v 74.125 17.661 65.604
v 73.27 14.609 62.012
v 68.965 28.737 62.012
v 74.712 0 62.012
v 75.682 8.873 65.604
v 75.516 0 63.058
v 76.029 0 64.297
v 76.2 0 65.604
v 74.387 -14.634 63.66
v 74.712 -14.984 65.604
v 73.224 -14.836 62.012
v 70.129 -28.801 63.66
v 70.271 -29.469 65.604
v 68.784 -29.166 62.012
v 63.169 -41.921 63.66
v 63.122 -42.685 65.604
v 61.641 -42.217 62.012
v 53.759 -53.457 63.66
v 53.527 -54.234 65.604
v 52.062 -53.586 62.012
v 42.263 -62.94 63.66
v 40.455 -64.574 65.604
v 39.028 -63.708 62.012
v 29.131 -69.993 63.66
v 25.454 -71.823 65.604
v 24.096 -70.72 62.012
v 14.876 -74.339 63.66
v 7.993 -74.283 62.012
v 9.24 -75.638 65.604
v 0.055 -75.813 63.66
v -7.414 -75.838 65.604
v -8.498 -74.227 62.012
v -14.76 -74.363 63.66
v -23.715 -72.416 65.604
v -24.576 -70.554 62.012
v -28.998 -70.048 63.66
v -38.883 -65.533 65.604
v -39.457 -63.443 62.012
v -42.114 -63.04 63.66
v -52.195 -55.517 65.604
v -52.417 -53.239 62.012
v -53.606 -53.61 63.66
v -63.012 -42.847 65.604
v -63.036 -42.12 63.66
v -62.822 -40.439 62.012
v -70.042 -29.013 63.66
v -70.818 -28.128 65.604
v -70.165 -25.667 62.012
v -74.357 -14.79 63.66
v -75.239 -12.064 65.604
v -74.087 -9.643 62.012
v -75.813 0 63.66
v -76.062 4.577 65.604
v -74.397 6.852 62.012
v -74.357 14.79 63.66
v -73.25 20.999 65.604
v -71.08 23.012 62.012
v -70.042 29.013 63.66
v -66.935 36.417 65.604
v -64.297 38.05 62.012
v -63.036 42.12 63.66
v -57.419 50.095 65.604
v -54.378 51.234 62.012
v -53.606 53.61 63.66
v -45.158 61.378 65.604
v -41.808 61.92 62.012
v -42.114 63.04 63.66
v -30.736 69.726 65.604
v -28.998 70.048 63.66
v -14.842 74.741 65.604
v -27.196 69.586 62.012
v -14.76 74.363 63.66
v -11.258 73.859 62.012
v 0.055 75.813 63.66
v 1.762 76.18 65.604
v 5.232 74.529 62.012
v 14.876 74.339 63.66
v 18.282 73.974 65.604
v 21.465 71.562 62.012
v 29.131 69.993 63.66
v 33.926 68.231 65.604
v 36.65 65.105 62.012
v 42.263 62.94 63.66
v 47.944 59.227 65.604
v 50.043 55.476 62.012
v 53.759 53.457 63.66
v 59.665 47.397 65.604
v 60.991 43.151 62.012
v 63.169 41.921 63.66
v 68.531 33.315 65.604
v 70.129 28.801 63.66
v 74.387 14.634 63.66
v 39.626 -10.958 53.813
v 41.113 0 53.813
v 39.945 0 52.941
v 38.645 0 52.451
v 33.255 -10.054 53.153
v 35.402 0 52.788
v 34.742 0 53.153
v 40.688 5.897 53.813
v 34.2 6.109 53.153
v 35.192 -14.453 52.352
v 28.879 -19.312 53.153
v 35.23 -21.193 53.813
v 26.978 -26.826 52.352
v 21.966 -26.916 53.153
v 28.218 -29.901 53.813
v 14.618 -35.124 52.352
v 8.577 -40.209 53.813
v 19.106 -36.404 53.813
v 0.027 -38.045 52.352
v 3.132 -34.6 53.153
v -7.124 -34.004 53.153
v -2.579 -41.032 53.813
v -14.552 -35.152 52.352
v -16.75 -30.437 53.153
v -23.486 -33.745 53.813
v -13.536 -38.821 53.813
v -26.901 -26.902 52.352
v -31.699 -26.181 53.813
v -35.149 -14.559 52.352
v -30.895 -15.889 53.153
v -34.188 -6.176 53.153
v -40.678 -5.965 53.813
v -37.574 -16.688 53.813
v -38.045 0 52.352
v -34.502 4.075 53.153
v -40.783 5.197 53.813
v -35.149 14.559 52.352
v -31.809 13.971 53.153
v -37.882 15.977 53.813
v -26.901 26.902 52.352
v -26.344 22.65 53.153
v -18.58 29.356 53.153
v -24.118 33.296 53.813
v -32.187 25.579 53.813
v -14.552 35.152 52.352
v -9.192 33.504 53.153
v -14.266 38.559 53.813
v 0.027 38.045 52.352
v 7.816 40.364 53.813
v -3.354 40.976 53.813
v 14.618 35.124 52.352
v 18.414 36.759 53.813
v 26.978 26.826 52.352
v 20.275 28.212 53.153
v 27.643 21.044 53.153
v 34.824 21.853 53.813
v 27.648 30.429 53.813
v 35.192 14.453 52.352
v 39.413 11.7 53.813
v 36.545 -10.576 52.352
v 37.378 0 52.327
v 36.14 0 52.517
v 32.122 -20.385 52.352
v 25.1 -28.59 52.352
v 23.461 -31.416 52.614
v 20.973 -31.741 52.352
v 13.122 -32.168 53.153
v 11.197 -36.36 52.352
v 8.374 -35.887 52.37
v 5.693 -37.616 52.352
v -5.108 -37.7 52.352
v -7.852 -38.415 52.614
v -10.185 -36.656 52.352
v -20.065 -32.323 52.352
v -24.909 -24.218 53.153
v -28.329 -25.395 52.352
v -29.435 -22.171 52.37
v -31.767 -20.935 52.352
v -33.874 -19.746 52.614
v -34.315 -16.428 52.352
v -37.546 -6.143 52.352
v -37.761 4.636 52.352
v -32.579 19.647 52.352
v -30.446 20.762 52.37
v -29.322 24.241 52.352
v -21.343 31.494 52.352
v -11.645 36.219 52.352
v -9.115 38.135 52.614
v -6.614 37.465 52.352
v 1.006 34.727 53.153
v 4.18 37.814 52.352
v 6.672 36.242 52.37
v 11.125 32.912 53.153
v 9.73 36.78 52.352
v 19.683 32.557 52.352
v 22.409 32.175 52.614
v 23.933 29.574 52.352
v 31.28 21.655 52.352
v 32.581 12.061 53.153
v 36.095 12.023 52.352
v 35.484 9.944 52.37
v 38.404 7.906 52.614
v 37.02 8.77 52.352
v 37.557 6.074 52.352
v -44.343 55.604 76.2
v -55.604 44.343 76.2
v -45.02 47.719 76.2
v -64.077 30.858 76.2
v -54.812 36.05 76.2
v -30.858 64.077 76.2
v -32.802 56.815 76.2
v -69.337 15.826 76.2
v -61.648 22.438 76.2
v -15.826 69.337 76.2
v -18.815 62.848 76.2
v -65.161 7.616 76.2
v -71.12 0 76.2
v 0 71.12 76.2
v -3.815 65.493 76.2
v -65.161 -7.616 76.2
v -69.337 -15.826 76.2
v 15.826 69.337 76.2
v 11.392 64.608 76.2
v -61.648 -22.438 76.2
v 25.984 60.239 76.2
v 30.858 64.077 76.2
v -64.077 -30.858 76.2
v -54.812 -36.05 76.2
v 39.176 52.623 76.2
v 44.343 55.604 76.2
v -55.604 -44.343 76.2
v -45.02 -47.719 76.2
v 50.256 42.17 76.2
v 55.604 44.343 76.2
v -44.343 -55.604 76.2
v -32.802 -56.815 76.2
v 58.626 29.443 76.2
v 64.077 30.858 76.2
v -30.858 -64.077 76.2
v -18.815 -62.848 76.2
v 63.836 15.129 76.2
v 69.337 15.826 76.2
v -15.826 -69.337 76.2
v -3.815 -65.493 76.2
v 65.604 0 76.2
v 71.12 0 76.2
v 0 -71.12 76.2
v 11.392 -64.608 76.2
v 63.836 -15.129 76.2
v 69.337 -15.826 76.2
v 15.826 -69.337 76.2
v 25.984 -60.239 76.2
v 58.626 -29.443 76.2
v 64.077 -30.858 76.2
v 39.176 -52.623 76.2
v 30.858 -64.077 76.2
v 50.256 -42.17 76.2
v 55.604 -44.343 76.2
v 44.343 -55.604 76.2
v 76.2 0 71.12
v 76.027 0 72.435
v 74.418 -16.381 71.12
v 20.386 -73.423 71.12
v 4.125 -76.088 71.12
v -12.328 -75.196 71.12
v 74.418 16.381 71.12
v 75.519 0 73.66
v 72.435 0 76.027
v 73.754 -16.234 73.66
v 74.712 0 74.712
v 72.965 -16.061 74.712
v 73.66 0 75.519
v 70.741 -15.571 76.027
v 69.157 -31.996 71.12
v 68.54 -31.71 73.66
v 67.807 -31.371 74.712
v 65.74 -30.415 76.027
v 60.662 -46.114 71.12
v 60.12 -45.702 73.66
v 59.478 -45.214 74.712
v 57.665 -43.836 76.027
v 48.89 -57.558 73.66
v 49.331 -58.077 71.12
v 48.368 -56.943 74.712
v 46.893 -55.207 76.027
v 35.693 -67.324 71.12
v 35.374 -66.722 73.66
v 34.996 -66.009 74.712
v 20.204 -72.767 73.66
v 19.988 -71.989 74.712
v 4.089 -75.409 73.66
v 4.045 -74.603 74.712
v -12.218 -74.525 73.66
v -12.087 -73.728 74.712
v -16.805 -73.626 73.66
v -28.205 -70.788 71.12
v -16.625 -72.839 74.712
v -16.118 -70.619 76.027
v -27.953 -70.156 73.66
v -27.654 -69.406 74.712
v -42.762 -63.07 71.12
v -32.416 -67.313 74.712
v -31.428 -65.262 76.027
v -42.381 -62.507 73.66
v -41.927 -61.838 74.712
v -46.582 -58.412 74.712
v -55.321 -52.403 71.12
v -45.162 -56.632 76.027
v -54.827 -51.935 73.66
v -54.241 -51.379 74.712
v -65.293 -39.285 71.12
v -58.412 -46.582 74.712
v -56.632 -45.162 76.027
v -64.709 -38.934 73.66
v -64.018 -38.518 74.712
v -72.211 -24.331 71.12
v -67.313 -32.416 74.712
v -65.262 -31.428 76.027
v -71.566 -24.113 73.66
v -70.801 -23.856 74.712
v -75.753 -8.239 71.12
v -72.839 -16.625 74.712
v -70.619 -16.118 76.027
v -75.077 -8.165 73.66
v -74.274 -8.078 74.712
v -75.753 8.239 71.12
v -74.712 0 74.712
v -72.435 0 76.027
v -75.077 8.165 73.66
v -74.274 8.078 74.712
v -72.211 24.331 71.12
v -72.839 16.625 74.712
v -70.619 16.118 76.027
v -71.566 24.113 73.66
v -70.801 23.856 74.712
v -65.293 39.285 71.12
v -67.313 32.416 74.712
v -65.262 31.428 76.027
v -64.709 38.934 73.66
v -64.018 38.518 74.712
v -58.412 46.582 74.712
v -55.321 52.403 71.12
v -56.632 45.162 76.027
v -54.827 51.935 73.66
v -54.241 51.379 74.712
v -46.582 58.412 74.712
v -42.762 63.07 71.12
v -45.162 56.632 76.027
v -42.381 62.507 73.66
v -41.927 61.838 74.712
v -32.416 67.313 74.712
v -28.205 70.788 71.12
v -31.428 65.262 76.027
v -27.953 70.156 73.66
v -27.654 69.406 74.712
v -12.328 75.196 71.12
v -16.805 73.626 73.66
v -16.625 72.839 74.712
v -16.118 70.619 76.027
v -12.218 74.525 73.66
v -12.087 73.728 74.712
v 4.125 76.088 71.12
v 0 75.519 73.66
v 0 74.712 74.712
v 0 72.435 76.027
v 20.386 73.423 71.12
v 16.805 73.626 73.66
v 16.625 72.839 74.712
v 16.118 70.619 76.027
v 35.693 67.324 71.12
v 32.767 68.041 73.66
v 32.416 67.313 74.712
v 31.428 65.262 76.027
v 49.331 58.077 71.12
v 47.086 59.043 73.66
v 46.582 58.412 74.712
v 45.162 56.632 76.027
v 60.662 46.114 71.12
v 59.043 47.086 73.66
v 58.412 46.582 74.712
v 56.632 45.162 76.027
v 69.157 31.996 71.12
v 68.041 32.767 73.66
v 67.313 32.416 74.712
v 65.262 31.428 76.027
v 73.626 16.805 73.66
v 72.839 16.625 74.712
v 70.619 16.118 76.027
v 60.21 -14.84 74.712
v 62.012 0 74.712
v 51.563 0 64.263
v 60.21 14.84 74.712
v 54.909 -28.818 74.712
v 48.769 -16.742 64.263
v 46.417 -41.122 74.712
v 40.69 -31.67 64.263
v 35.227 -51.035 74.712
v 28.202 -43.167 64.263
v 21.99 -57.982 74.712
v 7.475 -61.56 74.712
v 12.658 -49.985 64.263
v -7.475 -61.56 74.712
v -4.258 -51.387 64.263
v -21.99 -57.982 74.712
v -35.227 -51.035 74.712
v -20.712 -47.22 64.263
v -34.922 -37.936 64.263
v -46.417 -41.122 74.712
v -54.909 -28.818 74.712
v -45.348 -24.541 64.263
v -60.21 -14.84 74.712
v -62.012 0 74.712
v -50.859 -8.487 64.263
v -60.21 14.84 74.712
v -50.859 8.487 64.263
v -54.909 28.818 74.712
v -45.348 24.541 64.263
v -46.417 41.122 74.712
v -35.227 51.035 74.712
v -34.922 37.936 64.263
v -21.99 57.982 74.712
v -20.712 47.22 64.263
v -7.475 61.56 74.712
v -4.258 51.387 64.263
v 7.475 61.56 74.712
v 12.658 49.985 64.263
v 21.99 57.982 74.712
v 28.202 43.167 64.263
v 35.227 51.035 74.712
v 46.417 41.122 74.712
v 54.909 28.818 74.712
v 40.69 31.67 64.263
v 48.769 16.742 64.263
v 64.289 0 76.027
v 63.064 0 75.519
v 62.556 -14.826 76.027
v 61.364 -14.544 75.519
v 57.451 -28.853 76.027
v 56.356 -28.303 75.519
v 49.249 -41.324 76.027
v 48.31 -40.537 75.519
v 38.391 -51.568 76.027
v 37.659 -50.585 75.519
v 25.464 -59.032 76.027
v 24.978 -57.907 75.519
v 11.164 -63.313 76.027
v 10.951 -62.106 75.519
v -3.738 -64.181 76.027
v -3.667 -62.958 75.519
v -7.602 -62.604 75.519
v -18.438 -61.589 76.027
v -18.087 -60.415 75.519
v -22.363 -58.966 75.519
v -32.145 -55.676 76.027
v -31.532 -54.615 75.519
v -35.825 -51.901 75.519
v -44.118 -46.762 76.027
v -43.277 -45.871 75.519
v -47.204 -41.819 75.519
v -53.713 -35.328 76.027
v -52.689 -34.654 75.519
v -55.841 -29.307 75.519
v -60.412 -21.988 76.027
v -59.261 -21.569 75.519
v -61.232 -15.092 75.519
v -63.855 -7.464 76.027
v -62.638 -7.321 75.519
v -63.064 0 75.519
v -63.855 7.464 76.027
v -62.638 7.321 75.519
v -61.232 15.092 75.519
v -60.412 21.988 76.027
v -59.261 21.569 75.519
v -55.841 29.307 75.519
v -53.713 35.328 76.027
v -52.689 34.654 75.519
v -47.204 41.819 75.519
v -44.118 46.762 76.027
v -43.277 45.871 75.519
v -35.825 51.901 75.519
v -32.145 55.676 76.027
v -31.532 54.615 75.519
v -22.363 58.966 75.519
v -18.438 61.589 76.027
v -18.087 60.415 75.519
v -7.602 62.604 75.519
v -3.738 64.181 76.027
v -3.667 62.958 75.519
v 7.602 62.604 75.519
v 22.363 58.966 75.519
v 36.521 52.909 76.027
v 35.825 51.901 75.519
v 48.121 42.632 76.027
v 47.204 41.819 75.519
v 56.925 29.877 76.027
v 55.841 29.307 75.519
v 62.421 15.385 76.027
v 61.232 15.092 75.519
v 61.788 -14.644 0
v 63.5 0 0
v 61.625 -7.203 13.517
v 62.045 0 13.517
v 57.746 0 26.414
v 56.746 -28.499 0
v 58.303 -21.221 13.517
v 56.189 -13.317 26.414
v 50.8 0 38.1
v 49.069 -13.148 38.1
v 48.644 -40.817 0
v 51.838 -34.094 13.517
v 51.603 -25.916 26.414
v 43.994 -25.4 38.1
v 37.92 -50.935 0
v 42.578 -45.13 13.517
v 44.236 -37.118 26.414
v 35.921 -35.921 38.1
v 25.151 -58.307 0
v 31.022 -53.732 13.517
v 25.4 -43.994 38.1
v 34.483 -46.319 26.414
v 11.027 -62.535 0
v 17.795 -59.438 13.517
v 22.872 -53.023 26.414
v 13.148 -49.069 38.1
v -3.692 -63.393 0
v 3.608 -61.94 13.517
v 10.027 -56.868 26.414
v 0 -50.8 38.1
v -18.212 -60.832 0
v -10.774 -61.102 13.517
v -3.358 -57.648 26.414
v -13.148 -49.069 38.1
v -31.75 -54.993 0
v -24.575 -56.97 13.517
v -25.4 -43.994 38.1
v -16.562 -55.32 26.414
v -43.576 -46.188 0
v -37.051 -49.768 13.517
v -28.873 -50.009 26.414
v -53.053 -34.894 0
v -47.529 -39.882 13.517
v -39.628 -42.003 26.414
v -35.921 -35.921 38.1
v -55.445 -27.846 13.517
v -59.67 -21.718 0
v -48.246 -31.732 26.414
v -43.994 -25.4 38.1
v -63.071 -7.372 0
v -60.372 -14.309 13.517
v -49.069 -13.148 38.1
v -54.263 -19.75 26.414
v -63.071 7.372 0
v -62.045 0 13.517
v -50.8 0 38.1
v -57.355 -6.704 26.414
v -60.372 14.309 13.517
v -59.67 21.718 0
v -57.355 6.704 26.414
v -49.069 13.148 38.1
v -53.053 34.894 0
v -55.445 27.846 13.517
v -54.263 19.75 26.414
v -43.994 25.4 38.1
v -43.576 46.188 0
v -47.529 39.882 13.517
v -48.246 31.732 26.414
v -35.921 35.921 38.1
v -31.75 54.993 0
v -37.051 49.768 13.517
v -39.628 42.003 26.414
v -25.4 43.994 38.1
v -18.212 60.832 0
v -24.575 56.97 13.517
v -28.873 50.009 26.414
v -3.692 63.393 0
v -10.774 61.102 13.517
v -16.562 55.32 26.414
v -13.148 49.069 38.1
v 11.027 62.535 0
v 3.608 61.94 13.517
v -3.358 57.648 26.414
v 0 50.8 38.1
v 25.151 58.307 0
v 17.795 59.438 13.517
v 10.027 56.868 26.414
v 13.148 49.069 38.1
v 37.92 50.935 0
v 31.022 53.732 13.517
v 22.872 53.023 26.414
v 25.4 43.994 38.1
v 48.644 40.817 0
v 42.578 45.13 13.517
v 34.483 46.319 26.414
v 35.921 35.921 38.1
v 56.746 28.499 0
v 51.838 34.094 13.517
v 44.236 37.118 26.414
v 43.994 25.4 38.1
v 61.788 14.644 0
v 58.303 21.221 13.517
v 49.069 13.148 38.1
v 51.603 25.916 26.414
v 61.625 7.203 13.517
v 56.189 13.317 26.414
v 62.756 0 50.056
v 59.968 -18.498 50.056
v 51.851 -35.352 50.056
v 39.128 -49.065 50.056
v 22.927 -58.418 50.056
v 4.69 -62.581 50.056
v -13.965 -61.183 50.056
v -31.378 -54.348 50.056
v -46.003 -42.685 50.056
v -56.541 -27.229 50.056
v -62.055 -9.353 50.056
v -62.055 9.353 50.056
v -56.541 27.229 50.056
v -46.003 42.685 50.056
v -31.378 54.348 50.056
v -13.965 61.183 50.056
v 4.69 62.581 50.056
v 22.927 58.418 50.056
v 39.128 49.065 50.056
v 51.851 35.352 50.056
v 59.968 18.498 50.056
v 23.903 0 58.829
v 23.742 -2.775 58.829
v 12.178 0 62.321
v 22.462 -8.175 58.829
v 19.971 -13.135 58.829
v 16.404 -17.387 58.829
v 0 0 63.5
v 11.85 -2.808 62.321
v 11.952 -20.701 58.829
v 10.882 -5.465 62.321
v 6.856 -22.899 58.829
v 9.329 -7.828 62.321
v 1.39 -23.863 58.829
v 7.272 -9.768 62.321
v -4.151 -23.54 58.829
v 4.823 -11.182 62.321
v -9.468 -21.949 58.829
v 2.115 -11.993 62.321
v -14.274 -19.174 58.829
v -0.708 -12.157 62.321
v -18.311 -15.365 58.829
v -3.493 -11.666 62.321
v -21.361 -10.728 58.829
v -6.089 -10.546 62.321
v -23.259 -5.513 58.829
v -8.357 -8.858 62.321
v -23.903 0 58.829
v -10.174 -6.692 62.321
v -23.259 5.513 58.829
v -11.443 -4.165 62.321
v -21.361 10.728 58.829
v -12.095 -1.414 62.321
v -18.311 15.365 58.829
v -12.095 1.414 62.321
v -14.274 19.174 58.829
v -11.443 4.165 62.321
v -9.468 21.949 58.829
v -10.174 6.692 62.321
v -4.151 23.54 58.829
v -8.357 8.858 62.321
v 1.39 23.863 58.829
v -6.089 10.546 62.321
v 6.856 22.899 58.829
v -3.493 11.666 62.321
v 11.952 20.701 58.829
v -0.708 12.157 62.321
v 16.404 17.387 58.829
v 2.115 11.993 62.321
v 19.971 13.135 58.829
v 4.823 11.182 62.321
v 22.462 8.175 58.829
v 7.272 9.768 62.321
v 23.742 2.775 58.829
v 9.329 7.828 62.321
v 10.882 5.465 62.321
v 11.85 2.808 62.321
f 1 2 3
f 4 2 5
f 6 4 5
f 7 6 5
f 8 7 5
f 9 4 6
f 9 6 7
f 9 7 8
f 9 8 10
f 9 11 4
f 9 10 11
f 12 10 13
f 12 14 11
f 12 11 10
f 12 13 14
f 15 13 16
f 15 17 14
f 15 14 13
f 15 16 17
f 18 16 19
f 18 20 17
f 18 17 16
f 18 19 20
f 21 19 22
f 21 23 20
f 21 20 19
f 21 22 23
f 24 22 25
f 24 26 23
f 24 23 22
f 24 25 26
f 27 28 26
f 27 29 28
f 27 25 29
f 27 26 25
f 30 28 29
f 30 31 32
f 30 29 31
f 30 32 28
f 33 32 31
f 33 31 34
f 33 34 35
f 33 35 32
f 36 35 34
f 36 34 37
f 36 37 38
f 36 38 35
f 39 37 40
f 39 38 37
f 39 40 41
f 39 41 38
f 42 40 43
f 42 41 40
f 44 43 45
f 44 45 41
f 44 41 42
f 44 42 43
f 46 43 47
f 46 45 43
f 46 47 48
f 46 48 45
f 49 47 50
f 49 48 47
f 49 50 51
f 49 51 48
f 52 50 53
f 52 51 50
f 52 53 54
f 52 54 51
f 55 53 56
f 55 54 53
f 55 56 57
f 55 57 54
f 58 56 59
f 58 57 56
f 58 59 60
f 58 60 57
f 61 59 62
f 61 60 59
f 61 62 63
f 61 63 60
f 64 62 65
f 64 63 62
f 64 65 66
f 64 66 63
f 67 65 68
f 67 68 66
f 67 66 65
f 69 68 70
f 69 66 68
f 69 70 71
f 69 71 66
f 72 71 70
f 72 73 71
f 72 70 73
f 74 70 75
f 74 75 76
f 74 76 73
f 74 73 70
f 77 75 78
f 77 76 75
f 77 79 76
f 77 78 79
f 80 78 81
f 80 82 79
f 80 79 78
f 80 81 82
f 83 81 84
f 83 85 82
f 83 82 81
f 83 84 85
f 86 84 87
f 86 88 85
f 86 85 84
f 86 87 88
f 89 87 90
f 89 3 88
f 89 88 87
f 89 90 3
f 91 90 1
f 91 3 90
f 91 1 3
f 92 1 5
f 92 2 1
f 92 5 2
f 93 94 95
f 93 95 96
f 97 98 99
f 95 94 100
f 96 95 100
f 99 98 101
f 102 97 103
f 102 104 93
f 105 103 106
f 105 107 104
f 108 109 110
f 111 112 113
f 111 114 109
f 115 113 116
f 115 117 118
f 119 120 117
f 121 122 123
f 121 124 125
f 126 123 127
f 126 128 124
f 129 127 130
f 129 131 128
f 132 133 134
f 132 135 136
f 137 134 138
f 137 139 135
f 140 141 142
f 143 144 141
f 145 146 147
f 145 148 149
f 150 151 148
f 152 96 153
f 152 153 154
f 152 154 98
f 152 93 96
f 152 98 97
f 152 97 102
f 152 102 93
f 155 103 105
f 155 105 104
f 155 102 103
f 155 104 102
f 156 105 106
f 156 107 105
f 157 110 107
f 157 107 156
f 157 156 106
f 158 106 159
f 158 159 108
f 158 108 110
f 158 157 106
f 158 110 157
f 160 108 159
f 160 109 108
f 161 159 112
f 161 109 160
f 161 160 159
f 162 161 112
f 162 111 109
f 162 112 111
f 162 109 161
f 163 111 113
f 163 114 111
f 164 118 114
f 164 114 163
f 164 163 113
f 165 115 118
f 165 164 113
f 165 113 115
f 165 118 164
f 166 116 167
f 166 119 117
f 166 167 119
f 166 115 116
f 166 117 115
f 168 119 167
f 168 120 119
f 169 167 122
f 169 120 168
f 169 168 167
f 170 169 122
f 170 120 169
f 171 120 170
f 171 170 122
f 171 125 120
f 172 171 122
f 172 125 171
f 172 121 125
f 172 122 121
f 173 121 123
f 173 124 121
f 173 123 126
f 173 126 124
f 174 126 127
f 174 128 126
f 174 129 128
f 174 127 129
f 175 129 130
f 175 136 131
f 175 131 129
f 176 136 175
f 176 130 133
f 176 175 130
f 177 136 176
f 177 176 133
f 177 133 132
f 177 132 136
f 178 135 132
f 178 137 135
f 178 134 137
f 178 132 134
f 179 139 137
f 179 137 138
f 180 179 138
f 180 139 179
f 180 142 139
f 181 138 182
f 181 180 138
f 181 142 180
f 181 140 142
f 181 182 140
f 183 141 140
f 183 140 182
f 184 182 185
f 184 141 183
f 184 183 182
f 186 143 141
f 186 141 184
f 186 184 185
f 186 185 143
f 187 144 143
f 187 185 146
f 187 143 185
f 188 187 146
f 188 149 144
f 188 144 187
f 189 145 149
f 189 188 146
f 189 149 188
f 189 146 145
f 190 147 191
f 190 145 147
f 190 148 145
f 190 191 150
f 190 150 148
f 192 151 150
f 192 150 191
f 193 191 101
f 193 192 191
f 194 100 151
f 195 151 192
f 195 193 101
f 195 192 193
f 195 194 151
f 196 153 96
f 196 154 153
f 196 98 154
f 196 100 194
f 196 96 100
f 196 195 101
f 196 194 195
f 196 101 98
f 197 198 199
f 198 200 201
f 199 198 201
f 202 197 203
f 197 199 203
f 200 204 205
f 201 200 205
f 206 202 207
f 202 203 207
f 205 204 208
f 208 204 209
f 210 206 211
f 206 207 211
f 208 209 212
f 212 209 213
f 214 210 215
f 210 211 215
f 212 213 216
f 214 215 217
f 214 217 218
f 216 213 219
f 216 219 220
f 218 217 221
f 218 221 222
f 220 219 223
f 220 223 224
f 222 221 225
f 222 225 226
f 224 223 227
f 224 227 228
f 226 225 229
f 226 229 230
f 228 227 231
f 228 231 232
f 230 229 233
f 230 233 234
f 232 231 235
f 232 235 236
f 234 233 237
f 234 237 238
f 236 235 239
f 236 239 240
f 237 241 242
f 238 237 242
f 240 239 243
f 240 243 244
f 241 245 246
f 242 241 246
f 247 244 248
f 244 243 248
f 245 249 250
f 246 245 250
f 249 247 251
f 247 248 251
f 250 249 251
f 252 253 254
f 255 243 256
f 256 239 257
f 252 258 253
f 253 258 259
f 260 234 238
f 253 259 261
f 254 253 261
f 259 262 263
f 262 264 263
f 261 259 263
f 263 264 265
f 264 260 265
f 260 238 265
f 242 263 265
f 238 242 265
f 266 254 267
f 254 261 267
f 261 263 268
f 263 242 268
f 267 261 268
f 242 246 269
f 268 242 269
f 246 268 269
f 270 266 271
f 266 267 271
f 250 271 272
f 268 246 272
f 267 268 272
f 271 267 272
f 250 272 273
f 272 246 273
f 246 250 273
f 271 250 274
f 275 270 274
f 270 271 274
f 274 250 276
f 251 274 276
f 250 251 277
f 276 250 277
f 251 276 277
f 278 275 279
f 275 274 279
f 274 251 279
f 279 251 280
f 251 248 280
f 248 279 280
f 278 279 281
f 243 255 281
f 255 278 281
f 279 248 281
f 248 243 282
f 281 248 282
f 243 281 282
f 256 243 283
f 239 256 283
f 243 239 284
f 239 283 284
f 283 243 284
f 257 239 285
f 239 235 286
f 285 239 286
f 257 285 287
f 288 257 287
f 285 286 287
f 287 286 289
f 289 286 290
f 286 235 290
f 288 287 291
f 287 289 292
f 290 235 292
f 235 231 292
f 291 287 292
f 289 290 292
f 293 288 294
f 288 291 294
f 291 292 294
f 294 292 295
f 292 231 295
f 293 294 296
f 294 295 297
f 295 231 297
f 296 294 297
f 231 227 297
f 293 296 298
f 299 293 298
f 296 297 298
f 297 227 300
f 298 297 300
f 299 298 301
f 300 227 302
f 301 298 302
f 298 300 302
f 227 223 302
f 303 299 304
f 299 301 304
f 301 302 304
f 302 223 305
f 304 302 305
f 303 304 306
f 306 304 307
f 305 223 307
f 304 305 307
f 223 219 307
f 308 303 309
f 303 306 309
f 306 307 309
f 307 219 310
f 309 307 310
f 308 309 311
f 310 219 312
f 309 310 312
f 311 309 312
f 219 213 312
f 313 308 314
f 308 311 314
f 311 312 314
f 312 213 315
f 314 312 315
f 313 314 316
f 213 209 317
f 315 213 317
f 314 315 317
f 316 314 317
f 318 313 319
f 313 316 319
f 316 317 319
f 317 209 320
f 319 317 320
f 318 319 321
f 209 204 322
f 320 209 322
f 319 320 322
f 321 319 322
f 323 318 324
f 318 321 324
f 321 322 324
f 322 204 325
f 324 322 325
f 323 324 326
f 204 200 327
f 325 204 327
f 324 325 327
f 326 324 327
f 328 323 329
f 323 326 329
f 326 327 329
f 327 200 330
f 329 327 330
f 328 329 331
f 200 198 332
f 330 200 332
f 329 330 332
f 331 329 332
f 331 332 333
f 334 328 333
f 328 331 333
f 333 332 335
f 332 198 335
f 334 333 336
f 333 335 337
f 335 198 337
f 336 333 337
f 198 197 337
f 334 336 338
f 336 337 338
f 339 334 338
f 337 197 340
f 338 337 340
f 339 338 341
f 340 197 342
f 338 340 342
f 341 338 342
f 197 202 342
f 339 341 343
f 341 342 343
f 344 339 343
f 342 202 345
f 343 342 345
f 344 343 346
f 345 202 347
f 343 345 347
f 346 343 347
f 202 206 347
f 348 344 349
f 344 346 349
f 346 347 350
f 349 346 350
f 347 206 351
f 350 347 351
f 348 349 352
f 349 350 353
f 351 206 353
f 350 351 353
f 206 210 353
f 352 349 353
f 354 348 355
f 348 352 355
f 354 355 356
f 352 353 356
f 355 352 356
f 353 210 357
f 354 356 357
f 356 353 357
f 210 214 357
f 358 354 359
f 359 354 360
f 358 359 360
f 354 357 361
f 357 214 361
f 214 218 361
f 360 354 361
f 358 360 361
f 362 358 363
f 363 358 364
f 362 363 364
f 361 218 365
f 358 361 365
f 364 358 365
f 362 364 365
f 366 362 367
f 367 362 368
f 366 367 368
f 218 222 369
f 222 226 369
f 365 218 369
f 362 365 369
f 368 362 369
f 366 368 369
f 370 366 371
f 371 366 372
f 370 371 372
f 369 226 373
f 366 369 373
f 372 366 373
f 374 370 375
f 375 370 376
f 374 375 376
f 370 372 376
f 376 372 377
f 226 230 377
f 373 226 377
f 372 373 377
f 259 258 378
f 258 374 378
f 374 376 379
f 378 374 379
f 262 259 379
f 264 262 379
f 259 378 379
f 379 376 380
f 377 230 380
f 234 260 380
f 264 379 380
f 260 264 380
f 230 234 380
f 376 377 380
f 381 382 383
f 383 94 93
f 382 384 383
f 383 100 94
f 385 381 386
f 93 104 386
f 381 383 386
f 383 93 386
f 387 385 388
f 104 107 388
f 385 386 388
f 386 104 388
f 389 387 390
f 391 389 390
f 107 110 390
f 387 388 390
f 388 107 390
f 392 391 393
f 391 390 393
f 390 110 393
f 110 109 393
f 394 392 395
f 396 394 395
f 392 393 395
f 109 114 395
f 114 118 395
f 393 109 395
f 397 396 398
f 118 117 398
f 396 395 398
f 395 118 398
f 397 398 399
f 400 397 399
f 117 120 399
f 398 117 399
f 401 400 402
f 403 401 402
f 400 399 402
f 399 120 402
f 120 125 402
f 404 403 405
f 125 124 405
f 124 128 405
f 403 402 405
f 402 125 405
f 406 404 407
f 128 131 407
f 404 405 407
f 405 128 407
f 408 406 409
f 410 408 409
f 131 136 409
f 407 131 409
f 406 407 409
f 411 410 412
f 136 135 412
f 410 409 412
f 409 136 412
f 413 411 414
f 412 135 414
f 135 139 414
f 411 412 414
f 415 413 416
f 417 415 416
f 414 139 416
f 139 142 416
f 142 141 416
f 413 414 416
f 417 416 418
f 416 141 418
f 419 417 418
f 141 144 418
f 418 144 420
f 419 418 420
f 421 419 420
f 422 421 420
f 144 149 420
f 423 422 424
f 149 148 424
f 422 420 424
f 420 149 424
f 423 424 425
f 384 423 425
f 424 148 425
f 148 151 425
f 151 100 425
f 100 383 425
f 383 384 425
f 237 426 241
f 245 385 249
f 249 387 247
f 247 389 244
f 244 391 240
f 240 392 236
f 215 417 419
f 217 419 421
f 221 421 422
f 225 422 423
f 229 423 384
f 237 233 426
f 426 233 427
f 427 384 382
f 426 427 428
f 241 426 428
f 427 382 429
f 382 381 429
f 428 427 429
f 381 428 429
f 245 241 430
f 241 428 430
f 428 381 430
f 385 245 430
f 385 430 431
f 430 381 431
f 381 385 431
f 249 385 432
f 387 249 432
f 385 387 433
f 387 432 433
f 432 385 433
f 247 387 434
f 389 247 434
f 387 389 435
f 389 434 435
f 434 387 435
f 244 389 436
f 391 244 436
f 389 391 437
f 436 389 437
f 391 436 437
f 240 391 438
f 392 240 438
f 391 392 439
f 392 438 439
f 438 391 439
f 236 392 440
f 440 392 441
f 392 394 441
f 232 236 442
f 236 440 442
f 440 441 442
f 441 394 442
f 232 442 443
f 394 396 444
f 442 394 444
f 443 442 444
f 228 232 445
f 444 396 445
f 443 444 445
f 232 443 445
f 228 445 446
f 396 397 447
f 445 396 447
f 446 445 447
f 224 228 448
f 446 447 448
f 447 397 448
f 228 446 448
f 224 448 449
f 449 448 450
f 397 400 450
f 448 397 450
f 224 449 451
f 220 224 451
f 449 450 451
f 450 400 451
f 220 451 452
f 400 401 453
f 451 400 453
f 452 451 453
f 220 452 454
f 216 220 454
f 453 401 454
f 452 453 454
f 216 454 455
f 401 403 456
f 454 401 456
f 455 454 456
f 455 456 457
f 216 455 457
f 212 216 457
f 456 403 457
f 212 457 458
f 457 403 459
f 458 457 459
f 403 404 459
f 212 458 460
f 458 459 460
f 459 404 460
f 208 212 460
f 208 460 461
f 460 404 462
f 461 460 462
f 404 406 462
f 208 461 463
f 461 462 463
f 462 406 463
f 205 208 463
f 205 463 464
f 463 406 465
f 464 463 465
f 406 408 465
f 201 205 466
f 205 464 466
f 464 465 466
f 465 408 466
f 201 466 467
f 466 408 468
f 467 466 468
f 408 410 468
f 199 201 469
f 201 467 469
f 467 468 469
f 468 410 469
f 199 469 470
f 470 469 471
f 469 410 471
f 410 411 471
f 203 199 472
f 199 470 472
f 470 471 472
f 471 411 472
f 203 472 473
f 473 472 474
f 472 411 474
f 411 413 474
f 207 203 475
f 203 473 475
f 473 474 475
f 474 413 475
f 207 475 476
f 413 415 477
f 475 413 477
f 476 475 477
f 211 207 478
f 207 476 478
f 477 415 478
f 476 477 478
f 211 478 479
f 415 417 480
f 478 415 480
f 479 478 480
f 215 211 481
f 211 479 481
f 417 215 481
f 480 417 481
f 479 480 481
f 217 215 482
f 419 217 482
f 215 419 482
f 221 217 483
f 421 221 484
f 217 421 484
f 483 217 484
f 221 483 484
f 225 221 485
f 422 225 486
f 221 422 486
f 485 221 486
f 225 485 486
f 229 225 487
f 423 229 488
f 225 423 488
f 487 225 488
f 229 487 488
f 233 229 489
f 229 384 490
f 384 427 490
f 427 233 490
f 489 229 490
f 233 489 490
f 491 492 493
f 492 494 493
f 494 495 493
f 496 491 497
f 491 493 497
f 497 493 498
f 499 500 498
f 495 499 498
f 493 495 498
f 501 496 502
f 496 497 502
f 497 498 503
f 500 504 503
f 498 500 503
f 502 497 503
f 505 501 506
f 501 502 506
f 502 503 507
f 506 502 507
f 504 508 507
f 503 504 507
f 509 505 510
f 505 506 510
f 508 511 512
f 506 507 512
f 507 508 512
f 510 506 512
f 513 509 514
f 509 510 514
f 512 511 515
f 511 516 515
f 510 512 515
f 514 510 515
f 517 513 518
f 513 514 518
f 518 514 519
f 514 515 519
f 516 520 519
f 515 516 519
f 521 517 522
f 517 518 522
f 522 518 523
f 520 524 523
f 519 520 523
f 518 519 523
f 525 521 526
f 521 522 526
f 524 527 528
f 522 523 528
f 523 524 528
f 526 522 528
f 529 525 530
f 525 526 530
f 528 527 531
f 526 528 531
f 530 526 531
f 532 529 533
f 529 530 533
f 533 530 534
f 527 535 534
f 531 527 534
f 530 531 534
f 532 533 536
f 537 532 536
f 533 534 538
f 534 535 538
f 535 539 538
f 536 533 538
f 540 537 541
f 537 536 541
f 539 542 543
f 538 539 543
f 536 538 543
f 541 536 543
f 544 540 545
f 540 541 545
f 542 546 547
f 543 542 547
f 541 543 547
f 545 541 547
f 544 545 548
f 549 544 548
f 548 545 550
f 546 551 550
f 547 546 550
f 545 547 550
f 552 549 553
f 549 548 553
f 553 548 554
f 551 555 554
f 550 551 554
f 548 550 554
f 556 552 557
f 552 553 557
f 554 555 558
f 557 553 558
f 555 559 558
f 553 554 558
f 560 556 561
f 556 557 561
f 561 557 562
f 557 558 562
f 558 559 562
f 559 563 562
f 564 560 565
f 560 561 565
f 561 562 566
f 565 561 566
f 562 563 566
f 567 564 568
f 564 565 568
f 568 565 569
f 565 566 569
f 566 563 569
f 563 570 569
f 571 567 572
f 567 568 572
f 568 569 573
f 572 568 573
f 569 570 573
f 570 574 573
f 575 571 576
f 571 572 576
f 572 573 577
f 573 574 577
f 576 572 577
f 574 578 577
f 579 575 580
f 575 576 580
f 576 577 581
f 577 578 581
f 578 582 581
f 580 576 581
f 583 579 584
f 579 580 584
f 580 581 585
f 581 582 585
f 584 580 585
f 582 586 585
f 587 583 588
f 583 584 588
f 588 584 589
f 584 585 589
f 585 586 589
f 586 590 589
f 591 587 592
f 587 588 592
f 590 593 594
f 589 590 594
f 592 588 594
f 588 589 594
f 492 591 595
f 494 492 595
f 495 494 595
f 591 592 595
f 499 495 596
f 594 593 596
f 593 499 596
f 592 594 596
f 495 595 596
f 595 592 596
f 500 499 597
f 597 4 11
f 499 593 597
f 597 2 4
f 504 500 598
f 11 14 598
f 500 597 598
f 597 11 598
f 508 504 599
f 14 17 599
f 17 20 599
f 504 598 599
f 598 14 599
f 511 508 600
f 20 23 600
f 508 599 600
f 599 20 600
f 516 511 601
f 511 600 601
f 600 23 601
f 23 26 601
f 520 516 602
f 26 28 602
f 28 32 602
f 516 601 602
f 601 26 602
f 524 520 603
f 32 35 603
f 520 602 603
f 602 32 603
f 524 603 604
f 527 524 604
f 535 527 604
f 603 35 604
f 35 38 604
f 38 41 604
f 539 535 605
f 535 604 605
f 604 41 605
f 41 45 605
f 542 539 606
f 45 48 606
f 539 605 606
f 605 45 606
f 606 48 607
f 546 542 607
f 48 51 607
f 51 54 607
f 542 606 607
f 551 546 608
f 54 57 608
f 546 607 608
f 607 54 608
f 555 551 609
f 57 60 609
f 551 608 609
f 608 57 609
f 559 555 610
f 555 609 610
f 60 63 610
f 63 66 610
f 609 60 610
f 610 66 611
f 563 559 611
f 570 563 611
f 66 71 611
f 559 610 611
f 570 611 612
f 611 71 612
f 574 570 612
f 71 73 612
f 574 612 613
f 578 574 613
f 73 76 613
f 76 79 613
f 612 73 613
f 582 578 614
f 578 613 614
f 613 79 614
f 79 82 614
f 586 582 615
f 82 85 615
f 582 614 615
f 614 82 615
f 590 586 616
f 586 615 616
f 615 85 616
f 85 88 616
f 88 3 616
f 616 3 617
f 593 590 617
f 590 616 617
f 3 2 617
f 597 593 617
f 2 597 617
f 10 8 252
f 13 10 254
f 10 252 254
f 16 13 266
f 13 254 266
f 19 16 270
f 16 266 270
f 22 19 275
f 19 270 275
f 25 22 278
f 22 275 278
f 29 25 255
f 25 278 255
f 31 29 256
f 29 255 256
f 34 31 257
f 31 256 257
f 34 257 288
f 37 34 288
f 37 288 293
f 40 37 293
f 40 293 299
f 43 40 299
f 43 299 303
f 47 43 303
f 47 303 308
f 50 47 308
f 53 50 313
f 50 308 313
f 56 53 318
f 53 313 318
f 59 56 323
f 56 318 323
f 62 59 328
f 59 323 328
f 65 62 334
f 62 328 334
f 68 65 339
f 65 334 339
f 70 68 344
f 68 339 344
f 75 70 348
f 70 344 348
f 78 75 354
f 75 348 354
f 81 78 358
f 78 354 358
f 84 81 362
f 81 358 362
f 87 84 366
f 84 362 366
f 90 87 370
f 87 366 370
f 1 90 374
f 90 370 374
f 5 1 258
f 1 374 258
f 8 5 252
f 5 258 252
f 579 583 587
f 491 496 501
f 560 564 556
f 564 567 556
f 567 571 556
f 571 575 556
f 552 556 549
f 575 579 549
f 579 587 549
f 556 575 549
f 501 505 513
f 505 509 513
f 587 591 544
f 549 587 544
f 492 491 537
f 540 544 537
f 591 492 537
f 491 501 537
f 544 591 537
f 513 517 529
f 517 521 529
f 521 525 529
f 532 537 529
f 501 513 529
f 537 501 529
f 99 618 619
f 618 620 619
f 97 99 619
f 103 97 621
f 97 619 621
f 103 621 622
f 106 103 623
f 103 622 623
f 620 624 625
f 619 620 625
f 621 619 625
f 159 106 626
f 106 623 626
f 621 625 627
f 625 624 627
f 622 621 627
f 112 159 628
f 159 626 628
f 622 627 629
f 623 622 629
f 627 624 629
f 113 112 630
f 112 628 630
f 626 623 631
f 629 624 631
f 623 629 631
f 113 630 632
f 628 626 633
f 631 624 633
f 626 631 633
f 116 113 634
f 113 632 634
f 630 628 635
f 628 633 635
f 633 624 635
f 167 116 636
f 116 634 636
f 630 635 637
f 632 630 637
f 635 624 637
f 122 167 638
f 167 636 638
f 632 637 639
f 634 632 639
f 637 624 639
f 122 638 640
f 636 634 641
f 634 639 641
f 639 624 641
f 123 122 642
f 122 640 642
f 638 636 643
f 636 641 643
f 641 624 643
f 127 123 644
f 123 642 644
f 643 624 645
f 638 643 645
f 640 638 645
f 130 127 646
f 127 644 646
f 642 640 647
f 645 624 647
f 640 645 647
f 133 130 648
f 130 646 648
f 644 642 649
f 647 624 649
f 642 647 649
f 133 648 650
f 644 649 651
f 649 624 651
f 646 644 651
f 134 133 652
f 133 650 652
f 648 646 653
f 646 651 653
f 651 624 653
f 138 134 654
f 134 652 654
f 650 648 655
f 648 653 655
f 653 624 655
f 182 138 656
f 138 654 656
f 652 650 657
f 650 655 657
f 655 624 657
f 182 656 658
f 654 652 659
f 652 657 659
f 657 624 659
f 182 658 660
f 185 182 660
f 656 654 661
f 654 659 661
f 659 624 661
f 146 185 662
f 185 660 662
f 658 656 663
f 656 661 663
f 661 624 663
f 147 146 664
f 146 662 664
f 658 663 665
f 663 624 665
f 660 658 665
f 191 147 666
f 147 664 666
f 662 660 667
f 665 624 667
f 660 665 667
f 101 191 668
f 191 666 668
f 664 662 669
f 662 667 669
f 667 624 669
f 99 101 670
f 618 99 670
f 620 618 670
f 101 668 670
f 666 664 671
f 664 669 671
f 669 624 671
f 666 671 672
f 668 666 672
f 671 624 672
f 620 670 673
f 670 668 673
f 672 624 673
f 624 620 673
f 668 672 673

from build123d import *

# Parameters (mm, degrees)
F2_R = 5.08


with BuildPart() as f1:
    # F0 (on Front) → F1 (revolve)
    with BuildSketch(Plane.XZ):
        with BuildLine():
            Line((0, 0), (63.5, 0))
            ThreePointArc((63.5, 0), (60.2413894262, 20.0804631421), (50.8, 38.1))
            ThreePointArc((50.8, 38.1), (44.9012806053, 44.9012806053), (38.1, 50.8))
            ThreePointArc((38.1, 50.8), (20.0804631421, 60.2413894262), (0, 63.5))
            Line((0, 63.5), (0, 0))
        make_face()
        with BuildLine():
            ThreePointArc((38.1, 50.8), (44.9012806053, 44.9012806053), (50.8, 38.1))
            Line((50.8, 38.1), (76.2, 63.5))
            Line((76.2, 63.5), (76.2, 76.2))
            Line((76.2, 76.2), (63.5, 76.2))
            Line((63.5, 76.2), (38.1, 50.8))
        make_face()
    revolve(axis=Axis((0, 0, -31.75), (0, 0, -1)))

    # F2
    f2_edges = [f1.edges().sort_by_distance(p)[0] for p in [
        (-63.5, 0, 76.2),
        (-76.2, 0, 76.2),
        (-76.2, 0, 63.5),
        (-38.1, 0, 50.8),
    ]]
    fillet(f2_edges, radius=F2_R)


solid = f1.part
